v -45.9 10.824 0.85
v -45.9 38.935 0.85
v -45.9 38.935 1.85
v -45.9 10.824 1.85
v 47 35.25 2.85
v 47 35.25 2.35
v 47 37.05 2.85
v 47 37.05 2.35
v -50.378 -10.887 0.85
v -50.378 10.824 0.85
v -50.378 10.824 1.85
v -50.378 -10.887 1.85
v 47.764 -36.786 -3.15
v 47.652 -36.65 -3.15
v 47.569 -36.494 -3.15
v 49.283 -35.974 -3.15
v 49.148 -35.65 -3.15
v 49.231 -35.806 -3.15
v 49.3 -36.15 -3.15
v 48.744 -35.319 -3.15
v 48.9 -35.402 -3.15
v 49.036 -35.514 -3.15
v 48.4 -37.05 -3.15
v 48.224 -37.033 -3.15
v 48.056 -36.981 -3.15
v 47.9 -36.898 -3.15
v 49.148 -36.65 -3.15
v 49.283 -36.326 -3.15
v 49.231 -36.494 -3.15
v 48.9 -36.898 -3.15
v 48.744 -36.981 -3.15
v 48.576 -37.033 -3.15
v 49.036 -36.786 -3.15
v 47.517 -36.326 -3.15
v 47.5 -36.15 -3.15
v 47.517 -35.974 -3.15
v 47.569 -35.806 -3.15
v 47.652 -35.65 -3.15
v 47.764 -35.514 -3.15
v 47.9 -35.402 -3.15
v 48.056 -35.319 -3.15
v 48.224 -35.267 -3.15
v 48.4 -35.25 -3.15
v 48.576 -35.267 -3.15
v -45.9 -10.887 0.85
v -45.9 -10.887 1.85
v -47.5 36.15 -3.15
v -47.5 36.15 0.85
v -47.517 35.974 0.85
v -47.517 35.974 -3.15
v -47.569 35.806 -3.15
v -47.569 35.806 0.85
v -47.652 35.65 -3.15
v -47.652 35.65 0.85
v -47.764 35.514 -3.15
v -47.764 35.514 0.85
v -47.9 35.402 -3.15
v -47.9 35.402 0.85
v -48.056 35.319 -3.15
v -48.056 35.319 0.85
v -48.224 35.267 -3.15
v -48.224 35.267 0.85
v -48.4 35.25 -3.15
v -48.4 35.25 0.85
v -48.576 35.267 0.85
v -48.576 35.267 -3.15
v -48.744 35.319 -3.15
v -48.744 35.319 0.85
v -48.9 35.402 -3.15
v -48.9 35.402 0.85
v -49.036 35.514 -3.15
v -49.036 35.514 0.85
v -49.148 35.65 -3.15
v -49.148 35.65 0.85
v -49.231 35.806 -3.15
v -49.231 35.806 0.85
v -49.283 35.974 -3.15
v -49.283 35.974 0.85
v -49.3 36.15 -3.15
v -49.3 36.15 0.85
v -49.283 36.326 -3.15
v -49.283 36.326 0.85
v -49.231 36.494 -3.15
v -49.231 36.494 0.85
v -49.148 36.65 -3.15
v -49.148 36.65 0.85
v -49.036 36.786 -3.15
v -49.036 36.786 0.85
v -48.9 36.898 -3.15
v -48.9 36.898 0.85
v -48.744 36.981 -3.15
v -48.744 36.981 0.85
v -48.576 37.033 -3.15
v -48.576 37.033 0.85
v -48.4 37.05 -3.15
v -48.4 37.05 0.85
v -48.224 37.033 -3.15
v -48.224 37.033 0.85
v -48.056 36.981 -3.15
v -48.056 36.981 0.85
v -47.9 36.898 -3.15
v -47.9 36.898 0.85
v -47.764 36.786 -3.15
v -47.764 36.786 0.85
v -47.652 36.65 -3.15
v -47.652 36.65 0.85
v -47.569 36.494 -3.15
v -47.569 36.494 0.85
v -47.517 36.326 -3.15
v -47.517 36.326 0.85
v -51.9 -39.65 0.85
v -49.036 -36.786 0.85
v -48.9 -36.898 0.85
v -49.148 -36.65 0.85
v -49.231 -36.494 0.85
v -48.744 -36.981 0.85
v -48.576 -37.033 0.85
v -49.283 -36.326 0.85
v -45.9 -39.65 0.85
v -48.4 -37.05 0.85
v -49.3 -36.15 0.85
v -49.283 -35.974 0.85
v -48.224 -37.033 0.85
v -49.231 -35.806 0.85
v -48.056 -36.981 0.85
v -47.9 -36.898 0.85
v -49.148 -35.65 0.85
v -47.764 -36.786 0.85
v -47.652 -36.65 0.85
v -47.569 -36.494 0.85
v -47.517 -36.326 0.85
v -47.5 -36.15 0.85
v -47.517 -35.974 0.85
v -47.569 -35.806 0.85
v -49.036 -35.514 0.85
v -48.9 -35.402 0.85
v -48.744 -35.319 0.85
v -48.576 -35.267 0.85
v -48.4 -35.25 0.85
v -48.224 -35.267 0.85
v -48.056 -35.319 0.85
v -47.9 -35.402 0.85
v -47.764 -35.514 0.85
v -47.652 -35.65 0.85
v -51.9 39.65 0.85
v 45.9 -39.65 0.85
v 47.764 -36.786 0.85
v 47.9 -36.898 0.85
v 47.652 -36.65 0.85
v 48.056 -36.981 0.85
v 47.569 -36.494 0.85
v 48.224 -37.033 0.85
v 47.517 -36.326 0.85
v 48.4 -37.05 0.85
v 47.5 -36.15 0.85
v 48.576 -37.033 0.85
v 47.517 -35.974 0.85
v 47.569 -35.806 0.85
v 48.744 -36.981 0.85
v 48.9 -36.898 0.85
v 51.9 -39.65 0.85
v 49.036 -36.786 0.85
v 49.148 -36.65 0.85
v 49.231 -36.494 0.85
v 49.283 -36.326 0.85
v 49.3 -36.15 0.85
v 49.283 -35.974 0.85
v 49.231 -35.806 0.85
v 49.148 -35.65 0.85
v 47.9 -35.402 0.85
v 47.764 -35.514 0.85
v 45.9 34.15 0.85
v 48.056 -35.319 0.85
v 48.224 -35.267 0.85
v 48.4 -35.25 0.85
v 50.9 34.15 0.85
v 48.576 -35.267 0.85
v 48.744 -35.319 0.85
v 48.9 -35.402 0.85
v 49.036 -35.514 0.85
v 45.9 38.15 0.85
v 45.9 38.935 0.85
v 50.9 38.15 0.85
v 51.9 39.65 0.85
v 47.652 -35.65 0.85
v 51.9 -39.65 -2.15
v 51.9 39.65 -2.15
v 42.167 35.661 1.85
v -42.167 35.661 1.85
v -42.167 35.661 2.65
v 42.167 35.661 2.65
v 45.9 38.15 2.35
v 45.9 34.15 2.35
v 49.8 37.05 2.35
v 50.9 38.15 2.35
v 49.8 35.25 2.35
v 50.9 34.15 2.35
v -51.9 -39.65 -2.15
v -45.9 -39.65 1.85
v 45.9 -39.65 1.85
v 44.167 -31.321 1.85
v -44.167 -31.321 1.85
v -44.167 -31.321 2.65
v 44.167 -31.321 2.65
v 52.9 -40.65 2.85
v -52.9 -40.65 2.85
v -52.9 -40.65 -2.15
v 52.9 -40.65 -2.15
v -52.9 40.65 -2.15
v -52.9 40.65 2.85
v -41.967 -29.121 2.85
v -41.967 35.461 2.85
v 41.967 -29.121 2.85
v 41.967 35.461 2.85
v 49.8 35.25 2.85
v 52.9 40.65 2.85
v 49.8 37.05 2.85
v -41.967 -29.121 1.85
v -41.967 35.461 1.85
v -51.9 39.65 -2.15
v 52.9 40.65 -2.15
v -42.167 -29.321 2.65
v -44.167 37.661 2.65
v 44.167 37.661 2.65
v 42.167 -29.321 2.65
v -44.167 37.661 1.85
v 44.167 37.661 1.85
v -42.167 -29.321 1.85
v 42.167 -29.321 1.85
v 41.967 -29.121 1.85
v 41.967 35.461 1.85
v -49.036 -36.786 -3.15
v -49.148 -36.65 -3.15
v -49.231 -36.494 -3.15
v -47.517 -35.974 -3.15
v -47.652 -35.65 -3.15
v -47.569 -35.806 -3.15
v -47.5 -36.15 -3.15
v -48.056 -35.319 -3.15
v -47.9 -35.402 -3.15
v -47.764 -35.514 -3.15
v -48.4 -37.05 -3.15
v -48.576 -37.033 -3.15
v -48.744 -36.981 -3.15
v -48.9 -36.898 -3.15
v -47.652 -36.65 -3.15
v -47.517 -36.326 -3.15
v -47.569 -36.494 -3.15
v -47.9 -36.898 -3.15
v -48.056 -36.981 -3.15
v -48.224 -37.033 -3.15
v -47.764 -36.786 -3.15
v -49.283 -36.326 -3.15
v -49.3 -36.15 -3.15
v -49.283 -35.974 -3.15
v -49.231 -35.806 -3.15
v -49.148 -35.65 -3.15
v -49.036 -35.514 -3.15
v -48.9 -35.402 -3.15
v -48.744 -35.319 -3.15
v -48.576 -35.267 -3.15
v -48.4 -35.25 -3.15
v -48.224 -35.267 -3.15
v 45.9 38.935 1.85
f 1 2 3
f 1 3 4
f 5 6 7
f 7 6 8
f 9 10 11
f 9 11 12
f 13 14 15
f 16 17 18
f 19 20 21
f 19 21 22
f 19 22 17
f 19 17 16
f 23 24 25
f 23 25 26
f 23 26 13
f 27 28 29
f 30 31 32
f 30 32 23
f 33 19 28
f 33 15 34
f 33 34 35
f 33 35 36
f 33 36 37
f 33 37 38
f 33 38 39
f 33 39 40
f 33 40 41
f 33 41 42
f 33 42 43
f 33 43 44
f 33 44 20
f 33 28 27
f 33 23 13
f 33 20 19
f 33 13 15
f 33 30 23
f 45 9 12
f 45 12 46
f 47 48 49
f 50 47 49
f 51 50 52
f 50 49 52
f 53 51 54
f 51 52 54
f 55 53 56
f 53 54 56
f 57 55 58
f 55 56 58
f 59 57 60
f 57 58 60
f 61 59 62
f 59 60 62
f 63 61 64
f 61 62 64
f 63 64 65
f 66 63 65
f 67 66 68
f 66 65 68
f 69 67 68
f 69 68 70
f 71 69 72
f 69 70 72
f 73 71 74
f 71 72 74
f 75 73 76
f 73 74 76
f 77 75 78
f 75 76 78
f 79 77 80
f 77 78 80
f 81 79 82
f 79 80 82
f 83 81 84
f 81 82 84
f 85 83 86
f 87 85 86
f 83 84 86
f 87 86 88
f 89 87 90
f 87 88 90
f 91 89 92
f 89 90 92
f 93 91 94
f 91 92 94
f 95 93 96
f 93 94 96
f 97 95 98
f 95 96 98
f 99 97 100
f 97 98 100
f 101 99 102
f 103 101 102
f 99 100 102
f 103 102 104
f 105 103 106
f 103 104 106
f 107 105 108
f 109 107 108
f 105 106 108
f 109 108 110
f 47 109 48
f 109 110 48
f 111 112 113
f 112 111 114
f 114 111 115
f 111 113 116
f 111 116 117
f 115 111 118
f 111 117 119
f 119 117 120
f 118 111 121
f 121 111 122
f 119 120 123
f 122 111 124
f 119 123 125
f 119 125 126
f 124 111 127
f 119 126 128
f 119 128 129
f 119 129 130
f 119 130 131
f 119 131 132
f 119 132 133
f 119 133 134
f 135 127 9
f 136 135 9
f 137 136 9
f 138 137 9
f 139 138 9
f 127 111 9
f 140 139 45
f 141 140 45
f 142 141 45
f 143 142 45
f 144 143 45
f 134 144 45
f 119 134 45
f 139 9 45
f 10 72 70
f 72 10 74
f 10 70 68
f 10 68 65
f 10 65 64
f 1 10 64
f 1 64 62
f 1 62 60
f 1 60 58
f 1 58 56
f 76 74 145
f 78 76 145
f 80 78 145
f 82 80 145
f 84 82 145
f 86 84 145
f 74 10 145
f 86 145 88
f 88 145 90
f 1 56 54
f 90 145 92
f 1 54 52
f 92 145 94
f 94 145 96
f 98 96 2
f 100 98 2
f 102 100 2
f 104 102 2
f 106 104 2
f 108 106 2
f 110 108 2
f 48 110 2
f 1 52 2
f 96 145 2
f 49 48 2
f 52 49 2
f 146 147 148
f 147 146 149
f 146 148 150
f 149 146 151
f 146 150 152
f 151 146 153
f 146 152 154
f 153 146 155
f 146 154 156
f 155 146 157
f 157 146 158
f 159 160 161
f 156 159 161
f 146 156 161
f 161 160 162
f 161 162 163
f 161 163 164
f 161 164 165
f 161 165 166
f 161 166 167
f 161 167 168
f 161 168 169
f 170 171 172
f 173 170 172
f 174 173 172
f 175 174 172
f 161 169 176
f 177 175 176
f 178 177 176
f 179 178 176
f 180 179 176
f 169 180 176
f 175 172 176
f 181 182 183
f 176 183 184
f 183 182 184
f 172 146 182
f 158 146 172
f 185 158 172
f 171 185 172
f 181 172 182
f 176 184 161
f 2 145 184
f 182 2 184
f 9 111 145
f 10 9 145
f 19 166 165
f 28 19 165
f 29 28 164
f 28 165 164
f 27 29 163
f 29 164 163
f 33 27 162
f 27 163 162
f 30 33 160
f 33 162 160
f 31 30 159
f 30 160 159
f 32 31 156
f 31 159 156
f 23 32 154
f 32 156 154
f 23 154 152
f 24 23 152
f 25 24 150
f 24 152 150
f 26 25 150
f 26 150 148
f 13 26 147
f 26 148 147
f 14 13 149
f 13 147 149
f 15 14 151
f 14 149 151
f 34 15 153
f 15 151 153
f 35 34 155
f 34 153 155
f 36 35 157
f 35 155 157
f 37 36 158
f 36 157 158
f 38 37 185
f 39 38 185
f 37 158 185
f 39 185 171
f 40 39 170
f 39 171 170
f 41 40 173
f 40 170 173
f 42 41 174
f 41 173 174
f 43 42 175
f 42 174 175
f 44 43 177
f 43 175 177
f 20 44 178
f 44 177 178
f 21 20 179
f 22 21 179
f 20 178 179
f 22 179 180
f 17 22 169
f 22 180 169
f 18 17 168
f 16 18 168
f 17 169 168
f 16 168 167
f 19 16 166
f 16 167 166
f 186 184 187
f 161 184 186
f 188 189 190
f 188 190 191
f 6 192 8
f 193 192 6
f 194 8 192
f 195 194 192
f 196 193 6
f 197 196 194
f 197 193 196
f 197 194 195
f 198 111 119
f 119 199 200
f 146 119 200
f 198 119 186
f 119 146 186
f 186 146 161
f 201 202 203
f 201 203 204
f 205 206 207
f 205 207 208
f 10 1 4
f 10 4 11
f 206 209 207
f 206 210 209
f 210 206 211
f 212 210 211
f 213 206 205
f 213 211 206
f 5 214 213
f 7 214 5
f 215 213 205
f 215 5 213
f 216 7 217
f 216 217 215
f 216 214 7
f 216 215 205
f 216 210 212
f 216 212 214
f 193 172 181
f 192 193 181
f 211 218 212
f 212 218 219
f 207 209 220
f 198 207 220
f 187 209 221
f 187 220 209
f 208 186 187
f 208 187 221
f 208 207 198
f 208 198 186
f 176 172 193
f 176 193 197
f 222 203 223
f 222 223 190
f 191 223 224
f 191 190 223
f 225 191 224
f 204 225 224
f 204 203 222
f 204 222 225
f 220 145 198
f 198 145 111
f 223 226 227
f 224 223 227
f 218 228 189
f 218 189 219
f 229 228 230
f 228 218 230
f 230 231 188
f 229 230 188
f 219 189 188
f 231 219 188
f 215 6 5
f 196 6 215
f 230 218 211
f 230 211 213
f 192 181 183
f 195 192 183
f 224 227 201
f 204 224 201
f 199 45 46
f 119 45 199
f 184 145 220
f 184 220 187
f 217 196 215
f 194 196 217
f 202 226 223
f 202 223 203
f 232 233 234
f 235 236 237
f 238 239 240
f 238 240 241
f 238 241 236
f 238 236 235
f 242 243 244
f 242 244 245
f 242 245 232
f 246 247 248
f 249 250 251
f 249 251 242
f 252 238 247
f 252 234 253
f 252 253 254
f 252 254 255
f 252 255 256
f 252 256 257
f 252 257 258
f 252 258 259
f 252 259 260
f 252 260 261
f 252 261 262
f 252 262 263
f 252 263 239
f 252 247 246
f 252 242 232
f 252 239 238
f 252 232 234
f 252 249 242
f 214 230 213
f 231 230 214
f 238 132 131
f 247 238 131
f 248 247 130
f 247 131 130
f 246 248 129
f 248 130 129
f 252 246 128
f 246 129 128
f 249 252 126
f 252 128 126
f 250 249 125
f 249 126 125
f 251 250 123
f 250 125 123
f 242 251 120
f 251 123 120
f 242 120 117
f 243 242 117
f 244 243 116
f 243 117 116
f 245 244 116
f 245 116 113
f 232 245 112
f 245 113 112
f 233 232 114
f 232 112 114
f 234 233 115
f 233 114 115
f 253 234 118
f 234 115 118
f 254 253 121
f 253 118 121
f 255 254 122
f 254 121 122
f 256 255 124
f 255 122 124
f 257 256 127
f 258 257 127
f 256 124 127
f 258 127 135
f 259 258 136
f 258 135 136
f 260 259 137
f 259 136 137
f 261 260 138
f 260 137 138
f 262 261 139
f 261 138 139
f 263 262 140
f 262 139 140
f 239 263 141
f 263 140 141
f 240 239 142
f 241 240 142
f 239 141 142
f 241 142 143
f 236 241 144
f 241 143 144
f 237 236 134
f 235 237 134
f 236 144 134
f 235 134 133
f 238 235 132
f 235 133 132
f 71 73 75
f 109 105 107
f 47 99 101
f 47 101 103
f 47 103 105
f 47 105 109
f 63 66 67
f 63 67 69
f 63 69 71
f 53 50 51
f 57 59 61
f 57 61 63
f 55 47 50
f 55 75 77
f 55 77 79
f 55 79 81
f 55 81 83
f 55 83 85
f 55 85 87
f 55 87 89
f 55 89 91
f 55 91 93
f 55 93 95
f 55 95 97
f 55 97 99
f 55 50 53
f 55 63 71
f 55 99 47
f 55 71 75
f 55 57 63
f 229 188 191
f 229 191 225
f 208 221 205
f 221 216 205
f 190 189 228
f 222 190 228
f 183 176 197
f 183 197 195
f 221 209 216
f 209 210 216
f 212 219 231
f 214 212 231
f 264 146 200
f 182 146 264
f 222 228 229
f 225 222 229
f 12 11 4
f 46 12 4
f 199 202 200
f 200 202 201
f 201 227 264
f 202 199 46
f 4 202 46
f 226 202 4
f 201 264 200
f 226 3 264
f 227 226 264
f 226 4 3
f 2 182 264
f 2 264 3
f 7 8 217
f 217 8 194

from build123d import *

# Parameters (mm, degrees)
SKETCH_W        = 105.8
SKETCH_H        = 81.3
SKETCH_W_2      = 5
SKETCH_H_2      = 4
PAD_DEPTH       = 1
SKETCH001_W     = 105.8
SKETCH001_H     = 81.3
SKETCH001_W_2   = 83.934342
SKETCH001_H_2   = 64.581907
SKETCH001_W_3   = 2.8
SKETCH001_H_3   = 1.8
PAD001_DEPTH    = 1
SKETCH002_R     = 0.9
PAD002_DEPTH    = 4
SKETCH003_W     = 105.8
SKETCH003_H     = 81.3
SKETCH003_W_2   = 103.8
SKETCH003_H_2   = 79.3
PAD003_DEPTH    = 3
SKETCH014_W     = 5
SKETCH014_H     = 4
POCKET001_DEPTH = 0.5
SKETCH028_W     = 88.334342
SKETCH028_H     = 68.981907
SKETCH028_W_2   = 84.334342
SKETCH028_H_2   = 64.981907
POCKET015_DEPTH = 0.8


with BuildPart() as part:
    # Sketch (on Face286 of Binder) → Pad (new body)
    with BuildSketch(Plane.XY.offset(0.85)):
        Rectangle(SKETCH_W, SKETCH_H)
        Polygon((-45.8999, -39.65), (45.8999, -39.65), (45.8999, 38.9351), (-45.8999, 38.9351), (-45.8999, 10.824213), (-50.377559, 10.824213), (-50.377559, -10.886816), (-45.8999, -10.886816), align=None, mode=Mode.SUBTRACT)
        with Locations((48.4, 36.15)):
            Rectangle(SKETCH_W_2, SKETCH_H_2, mode=Mode.SUBTRACT)
    extrude(amount=PAD_DEPTH)

    # Sketch001 (on Face18 of Pad) → Pad001 (join)
    with BuildSketch(Plane.XY.offset(1.85)):
        Rectangle(SKETCH001_W, SKETCH001_H)
        with Locations((0, 3.16961)):
            Rectangle(SKETCH001_W_2, SKETCH001_H_2, mode=Mode.SUBTRACT)
        with Locations((48.4, 36.15)):
            Rectangle(SKETCH001_W_3, SKETCH001_H_3, mode=Mode.SUBTRACT)
    extrude(amount=PAD001_DEPTH)

    # Sketch002 (on Face1 of Pad001) → Pad002 (join)
    with BuildSketch(Plane(origin=(0, 0, 0.85), x_dir=(1, 0, 0), z_dir=(0, 0, -1))):
        with Locations((-48.4, 36.15)):
            Circle(SKETCH002_R)
        with Locations((48.4, 36.15)):
            Circle(SKETCH002_R)
        with Locations((-48.4, -36.15)):
            Circle(SKETCH002_R)
    extrude(amount=PAD002_DEPTH)

    # Sketch003 (on Face1 of Pad002) → Pad003 (join)
    with BuildSketch(Plane(origin=(0, 0, 0.85), x_dir=(1, 0, 0), z_dir=(0, 0, -1))):
        Rectangle(SKETCH003_W, SKETCH003_H)
        Rectangle(SKETCH003_W_2, SKETCH003_H_2, mode=Mode.SUBTRACT)
    extrude(amount=PAD003_DEPTH)

    # Sketch014 (on Face24 of Pad003) → Pocket001 (cut)
    with BuildSketch(Plane(origin=(0, 0, 1.85), x_dir=(1, 0, 0), z_dir=(0, 0, -1))):
        with Locations((48.4, -36.15)):
            Rectangle(SKETCH014_W, SKETCH014_H)
    extrude(amount=-POCKET001_DEPTH, mode=Mode.SUBTRACT)

    # Sketch028 (on Face19 of Pocket001) → Pocket015 (cut)
    with BuildSketch(Plane(origin=(0, 0, 1.85), x_dir=(1, 0, 0), z_dir=(0, 0, -1))):
        with Locations((0, -3.169609)):
            Rectangle(SKETCH028_W, SKETCH028_H)
        with Locations((0, -3.169609)):
            Rectangle(SKETCH028_W_2, SKETCH028_H_2, mode=Mode.SUBTRACT)
    extrude(amount=-POCKET015_DEPTH, mode=Mode.SUBTRACT)


solid = part.part
